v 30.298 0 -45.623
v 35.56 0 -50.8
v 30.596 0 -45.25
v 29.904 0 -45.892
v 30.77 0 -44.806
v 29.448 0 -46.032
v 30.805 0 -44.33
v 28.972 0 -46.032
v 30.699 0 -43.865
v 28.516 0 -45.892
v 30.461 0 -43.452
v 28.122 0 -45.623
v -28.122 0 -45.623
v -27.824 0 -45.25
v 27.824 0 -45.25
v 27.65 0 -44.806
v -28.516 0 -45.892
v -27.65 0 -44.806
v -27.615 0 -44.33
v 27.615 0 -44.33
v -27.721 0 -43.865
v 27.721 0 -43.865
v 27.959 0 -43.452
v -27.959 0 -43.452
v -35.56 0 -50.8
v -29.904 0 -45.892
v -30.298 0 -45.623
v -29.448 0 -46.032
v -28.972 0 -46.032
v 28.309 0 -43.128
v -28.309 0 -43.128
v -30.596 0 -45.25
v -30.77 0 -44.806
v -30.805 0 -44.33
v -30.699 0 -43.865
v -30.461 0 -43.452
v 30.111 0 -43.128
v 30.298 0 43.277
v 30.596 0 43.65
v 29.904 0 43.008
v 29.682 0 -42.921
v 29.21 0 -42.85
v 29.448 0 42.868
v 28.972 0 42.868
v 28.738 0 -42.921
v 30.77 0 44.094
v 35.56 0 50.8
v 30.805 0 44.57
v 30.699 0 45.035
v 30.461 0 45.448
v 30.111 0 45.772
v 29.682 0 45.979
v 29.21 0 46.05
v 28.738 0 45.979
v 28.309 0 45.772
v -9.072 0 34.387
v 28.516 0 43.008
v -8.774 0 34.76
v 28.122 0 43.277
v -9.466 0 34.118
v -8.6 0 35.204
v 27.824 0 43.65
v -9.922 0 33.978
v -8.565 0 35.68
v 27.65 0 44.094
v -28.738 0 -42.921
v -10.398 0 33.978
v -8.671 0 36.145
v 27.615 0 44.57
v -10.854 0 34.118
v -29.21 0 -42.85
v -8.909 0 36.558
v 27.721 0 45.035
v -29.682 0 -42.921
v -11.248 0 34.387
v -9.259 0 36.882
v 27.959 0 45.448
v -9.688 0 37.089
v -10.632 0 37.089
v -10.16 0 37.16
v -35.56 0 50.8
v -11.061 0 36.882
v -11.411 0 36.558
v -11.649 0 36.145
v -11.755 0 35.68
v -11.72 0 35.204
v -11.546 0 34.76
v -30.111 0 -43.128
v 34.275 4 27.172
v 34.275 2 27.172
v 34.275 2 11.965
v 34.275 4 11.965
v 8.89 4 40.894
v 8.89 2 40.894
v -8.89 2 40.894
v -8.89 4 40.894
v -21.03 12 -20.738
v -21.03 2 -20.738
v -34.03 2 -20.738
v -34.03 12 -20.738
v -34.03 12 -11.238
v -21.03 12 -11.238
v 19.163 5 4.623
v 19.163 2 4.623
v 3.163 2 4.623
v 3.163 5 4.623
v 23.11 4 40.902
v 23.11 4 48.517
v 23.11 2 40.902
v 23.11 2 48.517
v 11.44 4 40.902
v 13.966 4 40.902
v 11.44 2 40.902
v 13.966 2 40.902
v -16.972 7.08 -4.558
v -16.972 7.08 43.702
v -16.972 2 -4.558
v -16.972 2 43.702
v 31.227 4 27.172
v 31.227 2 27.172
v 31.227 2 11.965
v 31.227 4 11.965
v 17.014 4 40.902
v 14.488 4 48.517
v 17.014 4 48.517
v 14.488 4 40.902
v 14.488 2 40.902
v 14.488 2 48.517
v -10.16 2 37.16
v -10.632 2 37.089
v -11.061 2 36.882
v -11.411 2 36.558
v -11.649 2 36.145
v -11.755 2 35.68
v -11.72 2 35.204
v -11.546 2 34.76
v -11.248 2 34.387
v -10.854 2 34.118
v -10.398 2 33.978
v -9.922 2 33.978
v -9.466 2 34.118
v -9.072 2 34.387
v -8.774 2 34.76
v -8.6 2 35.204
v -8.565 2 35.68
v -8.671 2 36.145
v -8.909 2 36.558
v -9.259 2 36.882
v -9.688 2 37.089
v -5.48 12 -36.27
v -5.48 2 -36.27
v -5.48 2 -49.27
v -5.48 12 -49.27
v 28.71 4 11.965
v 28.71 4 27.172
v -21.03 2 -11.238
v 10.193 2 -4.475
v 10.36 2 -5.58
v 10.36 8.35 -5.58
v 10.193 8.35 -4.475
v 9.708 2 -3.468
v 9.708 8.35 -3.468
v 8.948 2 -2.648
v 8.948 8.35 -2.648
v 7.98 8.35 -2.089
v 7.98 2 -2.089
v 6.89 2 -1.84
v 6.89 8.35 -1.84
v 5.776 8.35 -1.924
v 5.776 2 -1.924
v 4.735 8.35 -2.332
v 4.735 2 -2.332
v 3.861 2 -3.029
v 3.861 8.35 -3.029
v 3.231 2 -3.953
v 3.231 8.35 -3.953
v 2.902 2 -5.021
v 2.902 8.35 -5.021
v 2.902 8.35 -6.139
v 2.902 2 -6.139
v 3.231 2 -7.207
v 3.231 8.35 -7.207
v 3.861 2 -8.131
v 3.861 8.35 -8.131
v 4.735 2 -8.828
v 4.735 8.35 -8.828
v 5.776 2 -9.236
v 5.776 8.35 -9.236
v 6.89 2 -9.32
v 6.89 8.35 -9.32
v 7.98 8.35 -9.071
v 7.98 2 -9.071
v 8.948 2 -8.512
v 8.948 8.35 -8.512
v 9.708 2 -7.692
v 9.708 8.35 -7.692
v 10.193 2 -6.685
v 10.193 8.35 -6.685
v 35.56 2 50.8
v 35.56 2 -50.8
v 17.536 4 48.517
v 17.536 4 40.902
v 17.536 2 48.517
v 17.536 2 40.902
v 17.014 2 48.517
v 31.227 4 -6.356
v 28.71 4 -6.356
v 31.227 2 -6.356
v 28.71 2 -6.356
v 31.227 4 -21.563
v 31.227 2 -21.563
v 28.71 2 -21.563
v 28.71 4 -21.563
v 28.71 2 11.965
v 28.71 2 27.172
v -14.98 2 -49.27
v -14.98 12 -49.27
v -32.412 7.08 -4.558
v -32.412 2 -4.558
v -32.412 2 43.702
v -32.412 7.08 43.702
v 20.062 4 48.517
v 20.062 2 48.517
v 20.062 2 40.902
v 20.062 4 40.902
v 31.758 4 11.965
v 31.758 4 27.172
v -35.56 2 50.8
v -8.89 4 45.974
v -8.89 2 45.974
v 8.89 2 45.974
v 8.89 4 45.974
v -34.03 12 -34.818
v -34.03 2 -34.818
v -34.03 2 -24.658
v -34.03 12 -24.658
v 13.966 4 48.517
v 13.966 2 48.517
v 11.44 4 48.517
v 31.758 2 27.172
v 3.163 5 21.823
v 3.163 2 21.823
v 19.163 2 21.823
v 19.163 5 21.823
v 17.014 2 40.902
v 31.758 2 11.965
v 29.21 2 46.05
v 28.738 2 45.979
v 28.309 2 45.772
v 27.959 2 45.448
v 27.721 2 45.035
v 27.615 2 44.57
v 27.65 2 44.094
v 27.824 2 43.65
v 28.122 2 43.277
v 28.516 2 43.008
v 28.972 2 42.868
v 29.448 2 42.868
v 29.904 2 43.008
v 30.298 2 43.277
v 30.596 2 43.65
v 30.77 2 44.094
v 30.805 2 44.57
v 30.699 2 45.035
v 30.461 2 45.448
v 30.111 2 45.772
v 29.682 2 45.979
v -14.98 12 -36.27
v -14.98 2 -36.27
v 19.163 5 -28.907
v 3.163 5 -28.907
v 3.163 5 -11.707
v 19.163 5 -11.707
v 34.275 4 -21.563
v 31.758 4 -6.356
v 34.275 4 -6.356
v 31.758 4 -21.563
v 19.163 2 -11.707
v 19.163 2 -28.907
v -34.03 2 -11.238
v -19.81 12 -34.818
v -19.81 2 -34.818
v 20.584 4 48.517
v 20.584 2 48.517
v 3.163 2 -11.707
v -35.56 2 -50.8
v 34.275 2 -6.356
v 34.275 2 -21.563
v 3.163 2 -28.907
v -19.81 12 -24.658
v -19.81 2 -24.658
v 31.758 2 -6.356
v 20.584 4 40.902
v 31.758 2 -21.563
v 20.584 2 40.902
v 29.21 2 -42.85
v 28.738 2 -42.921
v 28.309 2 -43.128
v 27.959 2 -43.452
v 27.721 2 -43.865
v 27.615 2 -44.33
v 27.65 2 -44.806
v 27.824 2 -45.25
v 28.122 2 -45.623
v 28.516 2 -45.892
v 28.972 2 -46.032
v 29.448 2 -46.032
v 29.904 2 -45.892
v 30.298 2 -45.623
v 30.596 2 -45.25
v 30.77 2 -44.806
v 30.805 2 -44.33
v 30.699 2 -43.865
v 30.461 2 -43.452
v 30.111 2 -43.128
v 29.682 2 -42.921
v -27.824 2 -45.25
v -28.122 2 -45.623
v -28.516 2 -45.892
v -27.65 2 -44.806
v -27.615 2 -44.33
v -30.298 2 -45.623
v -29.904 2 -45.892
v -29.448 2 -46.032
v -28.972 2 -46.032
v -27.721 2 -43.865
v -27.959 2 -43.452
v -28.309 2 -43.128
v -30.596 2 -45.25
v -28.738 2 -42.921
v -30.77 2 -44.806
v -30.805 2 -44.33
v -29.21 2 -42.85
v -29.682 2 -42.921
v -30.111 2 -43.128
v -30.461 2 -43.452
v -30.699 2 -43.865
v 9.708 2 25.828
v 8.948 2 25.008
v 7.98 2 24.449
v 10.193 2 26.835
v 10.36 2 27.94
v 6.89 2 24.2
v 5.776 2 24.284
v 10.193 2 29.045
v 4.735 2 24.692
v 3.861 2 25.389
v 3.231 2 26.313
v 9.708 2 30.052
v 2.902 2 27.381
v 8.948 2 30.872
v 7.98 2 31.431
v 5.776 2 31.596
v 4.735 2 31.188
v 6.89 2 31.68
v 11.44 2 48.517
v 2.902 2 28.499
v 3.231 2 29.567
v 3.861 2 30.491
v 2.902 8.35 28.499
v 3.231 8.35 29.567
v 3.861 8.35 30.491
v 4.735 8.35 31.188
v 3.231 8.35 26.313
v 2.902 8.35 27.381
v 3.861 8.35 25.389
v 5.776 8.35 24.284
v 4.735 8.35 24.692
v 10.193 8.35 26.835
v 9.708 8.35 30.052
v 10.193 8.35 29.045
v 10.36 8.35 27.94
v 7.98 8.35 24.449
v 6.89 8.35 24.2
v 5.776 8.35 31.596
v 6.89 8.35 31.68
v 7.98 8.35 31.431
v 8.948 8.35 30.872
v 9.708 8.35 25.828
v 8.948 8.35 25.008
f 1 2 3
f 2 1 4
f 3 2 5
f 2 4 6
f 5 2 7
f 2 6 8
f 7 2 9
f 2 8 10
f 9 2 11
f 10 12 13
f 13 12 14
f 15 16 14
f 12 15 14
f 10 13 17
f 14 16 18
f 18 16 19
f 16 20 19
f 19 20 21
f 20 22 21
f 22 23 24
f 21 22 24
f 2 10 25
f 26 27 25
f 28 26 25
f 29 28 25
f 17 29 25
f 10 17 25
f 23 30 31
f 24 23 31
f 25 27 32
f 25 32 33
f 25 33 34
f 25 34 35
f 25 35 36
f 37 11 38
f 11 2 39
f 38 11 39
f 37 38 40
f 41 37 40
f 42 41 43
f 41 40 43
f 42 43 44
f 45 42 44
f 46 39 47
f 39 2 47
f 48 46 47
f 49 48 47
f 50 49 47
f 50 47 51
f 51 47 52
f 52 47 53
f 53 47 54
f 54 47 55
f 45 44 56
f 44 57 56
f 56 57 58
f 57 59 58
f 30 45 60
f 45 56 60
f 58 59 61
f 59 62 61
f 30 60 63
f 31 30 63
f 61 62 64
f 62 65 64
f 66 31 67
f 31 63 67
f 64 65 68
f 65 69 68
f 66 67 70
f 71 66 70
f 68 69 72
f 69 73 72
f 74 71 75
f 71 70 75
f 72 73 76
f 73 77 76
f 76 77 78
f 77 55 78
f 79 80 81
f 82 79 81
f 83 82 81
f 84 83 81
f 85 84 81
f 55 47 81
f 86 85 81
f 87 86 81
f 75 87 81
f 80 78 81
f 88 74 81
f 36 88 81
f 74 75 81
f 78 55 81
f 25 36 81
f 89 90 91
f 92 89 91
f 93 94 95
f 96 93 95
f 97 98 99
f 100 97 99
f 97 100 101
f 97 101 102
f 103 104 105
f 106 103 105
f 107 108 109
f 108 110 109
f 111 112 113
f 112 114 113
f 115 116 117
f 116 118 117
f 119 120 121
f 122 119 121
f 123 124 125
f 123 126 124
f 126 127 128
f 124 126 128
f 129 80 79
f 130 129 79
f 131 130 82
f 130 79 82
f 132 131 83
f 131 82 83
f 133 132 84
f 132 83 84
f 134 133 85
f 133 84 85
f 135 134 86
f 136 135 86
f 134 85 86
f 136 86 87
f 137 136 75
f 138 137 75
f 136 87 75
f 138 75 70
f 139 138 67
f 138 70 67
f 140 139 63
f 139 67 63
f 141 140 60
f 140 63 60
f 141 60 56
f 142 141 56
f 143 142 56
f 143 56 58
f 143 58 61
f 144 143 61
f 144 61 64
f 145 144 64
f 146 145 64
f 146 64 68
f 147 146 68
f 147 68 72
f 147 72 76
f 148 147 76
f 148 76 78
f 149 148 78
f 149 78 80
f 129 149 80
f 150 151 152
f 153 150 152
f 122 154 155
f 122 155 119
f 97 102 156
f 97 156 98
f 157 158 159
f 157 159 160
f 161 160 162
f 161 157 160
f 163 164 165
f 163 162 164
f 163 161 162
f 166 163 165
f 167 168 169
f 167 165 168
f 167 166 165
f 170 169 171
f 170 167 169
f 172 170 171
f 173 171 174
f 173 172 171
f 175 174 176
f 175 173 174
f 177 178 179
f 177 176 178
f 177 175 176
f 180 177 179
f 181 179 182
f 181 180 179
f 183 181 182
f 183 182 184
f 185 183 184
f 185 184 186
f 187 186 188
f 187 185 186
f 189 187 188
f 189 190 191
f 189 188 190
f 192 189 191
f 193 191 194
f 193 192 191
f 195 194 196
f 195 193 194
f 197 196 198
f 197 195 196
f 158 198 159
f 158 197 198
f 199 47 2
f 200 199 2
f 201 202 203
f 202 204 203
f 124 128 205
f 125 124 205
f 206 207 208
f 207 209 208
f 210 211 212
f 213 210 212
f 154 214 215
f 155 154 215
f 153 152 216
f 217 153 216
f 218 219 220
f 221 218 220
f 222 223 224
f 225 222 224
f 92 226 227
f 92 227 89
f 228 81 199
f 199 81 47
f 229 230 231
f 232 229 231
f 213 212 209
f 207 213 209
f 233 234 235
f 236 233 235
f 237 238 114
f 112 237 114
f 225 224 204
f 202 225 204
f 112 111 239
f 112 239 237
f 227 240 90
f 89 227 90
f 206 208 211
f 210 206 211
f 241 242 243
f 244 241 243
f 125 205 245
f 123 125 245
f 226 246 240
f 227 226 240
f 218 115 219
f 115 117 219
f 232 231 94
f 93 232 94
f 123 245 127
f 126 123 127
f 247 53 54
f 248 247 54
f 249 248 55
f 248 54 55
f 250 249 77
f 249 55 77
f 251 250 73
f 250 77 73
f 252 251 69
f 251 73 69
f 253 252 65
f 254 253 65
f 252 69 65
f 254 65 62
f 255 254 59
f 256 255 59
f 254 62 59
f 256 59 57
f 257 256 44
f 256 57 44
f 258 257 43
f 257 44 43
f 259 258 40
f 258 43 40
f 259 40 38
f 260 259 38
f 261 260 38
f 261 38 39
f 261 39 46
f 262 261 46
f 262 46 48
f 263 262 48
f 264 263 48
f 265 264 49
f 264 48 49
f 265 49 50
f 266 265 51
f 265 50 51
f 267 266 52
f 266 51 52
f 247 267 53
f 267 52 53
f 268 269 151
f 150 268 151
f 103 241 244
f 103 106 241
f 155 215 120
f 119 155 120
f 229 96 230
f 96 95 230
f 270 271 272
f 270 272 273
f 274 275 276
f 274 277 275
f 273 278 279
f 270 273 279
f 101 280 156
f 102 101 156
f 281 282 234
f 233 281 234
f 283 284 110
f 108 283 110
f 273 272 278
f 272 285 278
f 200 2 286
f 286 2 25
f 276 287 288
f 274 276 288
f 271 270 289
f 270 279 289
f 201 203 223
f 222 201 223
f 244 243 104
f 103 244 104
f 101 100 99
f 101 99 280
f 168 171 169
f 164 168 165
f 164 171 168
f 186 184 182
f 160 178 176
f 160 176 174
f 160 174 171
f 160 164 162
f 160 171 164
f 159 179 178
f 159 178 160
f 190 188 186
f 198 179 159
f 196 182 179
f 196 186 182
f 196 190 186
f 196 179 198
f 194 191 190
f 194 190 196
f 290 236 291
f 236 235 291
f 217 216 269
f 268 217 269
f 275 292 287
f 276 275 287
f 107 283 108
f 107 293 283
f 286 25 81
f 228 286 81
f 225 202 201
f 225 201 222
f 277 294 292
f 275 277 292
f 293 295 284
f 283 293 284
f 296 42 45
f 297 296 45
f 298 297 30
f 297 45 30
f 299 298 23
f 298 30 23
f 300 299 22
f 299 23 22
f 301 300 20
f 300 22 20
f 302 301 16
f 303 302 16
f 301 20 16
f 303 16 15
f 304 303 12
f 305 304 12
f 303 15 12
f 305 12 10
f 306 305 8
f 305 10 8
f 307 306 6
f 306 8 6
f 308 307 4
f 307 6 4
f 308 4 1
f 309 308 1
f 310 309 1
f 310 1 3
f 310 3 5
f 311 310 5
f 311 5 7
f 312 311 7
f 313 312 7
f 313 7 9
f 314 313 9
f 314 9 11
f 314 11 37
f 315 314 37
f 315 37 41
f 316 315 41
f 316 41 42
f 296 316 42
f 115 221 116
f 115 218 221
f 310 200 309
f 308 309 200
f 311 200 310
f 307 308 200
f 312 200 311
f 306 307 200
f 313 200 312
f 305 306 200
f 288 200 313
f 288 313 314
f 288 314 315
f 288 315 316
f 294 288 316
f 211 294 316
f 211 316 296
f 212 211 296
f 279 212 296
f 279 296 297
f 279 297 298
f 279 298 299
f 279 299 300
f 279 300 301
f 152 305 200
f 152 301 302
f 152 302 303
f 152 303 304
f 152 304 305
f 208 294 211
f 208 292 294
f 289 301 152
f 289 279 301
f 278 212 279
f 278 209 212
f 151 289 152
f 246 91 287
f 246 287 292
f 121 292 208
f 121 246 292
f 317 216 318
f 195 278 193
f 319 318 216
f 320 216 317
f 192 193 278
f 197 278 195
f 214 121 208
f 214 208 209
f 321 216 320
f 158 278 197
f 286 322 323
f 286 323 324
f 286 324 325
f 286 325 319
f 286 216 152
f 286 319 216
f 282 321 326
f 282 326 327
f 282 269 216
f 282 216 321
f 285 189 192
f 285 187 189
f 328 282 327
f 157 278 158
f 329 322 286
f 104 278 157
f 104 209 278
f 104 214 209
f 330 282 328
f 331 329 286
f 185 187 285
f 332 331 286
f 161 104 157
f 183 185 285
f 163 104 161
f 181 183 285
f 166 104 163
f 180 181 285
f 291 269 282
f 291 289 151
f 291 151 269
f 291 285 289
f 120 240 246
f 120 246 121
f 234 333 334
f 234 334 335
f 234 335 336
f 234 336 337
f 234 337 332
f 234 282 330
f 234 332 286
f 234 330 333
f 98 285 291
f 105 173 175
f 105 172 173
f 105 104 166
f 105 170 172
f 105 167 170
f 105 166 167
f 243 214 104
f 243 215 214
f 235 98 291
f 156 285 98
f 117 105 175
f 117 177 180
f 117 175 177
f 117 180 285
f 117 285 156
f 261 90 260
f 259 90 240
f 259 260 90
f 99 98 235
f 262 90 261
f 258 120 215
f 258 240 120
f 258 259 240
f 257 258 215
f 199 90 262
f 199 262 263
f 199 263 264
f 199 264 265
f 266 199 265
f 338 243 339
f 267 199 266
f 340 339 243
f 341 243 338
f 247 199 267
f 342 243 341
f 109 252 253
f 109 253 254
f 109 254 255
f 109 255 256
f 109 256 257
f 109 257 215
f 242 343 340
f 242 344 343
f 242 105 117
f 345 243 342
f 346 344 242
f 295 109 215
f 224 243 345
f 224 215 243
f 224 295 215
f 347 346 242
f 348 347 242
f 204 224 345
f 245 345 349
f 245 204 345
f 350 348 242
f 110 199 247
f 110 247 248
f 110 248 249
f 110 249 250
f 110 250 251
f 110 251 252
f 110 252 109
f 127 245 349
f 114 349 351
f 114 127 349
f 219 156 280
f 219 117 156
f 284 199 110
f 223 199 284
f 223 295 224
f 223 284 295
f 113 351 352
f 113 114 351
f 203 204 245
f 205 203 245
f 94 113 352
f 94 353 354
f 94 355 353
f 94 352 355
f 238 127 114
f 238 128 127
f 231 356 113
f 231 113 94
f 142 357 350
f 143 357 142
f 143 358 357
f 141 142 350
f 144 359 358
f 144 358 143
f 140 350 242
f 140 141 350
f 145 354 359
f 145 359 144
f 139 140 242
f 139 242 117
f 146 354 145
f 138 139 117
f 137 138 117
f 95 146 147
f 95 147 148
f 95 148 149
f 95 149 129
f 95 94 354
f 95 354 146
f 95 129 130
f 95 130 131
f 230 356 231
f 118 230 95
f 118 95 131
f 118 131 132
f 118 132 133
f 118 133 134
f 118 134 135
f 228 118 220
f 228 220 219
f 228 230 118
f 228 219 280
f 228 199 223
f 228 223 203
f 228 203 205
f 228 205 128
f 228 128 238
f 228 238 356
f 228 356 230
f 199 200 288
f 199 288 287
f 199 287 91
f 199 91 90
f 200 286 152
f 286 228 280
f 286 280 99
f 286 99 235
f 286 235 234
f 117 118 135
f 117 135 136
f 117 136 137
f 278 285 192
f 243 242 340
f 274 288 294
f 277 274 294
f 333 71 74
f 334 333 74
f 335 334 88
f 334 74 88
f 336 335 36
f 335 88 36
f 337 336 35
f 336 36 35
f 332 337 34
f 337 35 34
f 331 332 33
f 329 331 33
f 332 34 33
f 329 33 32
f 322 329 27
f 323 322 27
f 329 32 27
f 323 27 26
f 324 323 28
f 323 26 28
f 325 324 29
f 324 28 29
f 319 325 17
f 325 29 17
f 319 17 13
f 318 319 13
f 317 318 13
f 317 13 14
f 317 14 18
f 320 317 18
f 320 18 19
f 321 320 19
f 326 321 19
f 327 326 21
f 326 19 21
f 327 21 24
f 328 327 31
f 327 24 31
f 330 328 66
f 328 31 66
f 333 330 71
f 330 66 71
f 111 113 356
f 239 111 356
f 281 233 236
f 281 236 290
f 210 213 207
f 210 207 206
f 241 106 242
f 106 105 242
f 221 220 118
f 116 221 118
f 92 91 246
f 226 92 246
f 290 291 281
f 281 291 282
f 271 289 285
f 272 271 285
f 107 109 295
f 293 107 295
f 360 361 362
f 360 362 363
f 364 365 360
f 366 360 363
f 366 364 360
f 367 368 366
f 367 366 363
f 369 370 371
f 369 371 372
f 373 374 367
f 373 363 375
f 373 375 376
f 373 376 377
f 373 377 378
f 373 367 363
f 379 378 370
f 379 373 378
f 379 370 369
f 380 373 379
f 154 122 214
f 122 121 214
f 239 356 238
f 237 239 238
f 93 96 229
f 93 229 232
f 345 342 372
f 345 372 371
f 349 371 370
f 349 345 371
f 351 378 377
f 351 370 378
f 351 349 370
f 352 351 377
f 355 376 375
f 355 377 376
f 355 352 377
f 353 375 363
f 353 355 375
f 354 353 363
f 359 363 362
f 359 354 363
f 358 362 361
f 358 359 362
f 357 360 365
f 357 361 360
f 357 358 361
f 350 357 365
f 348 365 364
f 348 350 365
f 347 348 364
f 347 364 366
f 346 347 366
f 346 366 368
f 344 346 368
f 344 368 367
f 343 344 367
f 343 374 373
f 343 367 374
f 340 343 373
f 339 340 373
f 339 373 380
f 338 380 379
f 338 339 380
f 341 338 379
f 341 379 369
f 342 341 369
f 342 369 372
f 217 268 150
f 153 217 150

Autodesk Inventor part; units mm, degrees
ref_plane "YZ Plane" through (0, 0, 0) normal (1, 0, 0) x (0, 1, 0)
ref_plane "XZ Plane" through (0, 0, 0) normal (0, 1, 0) x (-1, 0, 0)
ref_plane "XY Plane" through (0, 0, 0) normal (0, 0, 1) x (1, 0, 0)
sketch "Sketch1" plane through (0, 0, 0) normal (0, 1, 0) x (-1, 0, 0)
  line L0 (35.56, 50.8) -> (-35.56, 50.8)
  line L1 (-35.56, 50.8) -> (-35.56, -50.8)
  line L2 (-35.56, -50.8) -> (35.56, -50.8)
  line L3 (35.56, -50.8) -> (35.56, 50.8)
  point P0 (0, 0)
  point P1 (35.56, 0)
  point P2 (0, -50.8)
  dimension "d0" = 101.6
  dimension "d1" = 71.12
extrude "Extrusion1" add sketch "Sketch1" along normal blind 2
sketch "Sketch2" plane through (0, 2, 0) normal (0, 1, 0) x (1, 0, 0)
  line L0 (-35.56, 50.8) -> (-35.56, -50.8)
  line L1 (35.56, 50.8) -> (-35.56, 50.8)
  line L2 (35.56, -50.8) -> (35.56, 50.8)
  line L3 (-35.56, -50.8) -> (35.56, -50.8)
  point P0 (0, 0)
  point P1 (-10.16, -35.56)
  point P2 (-29.21, 44.45)
  point P3 (29.21, 44.45)
  point P4 (29.21, -44.45)
  dimension "d4" = 6.35
  dimension "d5" = 6.35
  dimension "d6" = 6.35
  dimension "d7" = 6.35
  dimension "d8" = 15.24
  dimension "d9" = 45.72
hole "Hole1" at (-10.16, 2, 35.56) at (-29.21, 2, -44.45) at (29.21, 2, -44.45) at (29.21, 2, 44.45) direction (0, -1, 0) diameter 3.1999 end through all
sketch "Sketch3" plane through (0, 2, 0) normal (0, 1, 0) x (1, 0, 0)
  line L0 (-32.412, -43.7017) -> (-16.972, -43.7017)
  line L1 (-16.972, -43.7017) -> (-16.972, 4.5583)
  line L2 (-16.972, 4.5583) -> (-32.412, 4.5583)
  line L3 (-32.412, 4.5583) -> (-32.412, -43.7017)
  line L4 (-35.56, -50.8) -> (35.56, -50.8)
  line L5 (-35.56, 50.8) -> (-35.56, -50.8)
  point P0 (0, 0)
  dimension "d17" = 15.44
  dimension "d18" = 48.26
  dimension "d19" = 7.0983
  dimension "d20" = 3.148
extrude "Extrusion2" add sketch "Sketch3" along normal blind 5.08
sketch "Sketch4" plane through (0, 2, 0) normal (0, 1, 0) x (1, 0, 0)
  line L0 (-34.03, 11.2383) -> (-21.03, 11.2383)
  line L1 (-21.03, 11.2383) -> (-21.03, 20.7383)
  line L2 (-21.03, 20.7383) -> (-34.03, 20.7383)
  line L3 (-34.03, 20.7383) -> (-34.03, 11.2383)
  line L4 (-34.03, 24.6583) -> (-19.81, 24.6583)
  line L5 (-19.81, 24.6583) -> (-19.81, 34.8183)
  line L6 (-19.81, 34.8183) -> (-34.03, 34.8183)
  line L7 (-34.03, 34.8183) -> (-34.03, 24.6583)
  line L8 (-14.98, 36.27) -> (-5.48, 36.27)
  line L9 (-5.48, 36.27) -> (-5.48, 49.27)
  line L10 (-5.48, 49.27) -> (-14.98, 49.27)
  line L11 (-14.98, 49.27) -> (-14.98, 36.27)
  line L12 (-16.972, 4.5583) -> (-32.412, 4.5583)
  line L13 (-35.56, 50.8) -> (-35.56, -50.8)
  line L14 (35.56, 50.8) -> (-35.56, 50.8)
  point P0 (0, 0)
  dimension "d23" = 13
  dimension "d24" = 9.5
  dimension "d25" = 3.92
  dimension "d26" = 6.68
  dimension "d27" = 1.53
  dimension "d28" = 1.53
  dimension "d29" = 20.58
  dimension "d66" = 14.22
  dimension "d67" = 13
  dimension "d68" = 10.16
extrude "Extrusion3" add sketch "Sketch4" along normal blind 10
sketch "Sketch5" plane through (0, 2, 0) normal (0, 1, 0) x (1, 0, 0)
  line L0 (3.1628, -21.8228) -> (19.1628, -21.8228)
  line L1 (19.1628, -21.8228) -> (19.1628, -4.6228)
  line L2 (19.1628, -4.6228) -> (3.1628, -4.6228)
  line L3 (3.1628, -4.6228) -> (3.1628, -21.8228)
  line L4 (3.1628, 11.7072) -> (19.1628, 11.7072)
  line L5 (19.1628, 11.7072) -> (19.1628, 28.9072)
  line L6 (19.1628, 28.9072) -> (3.1628, 28.9072)
  line L7 (3.1628, 28.9072) -> (3.1628, 11.7072)
  line L8 (35.56, -50.8) -> (35.56, 50.8)
  line L9 (35.56, 50.8) -> (-35.56, 50.8)
  point P0 (0, 0)
  dimension "d32" = 17.2
  dimension "d33" = 16
  dimension "d34" = 16.33
  dimension "d35" = 16.3972
  dimension "d36" = 21.8928
extrude "Extrusion4" add sketch "Sketch5" along normal blind 3
sketch "Sketch6" plane through (0, 2, 0) normal (0, 1, 0) x (1, 0, 0)
  circle A0 centre (6.61, -27.94) radius 3.75
  circle A1 centre (6.61, 5.58) radius 3.75
  line L0 (35.56, -50.8) -> (35.56, 50.8)
  line L1 (-35.56, -50.8) -> (35.56, -50.8)
  point P0 (0, 0)
  dimension "d39" = 7.5
  dimension "d40" = 26.02
  dimension "d41" = 25.2
  dimension "d42" = 19.11
extrude "Extrusion5" add sketch "Sketch6" along normal blind 6.35
sketch "Sketch7" plane through (0, 2, 0) normal (0, 1, 0) x (1, 0, 0)
  line L0 (11.4397, -48.5168) -> (13.9664, -48.5168)
  line L1 (13.9664, -48.5168) -> (13.9664, -40.9016)
  line L2 (13.9664, -40.9016) -> (11.4397, -40.9016)
  line L3 (11.4397, -40.9016) -> (11.4397, -48.5168)
  line L4 (14.4877, -48.5168) -> (17.0144, -48.5168)
  line L5 (17.0144, -48.5168) -> (17.0144, -40.9016)
  line L6 (17.0144, -40.9016) -> (14.4877, -40.9016)
  line L7 (14.4877, -40.9016) -> (14.4877, -48.5168)
  line L8 (17.5357, -48.5168) -> (20.0624, -48.5168)
  line L9 (20.0624, -48.5168) -> (20.0624, -40.9016)
  line L10 (20.0624, -40.9016) -> (17.5357, -40.9016)
  line L11 (17.5357, -40.9016) -> (17.5357, -48.5168)
  line L12 (20.5837, -48.5168) -> (23.1104, -48.5168)
  line L13 (23.1104, -48.5168) -> (23.1104, -40.9016)
  line L14 (23.1104, -40.9016) -> (20.5837, -40.9016)
  line L15 (20.5837, -40.9016) -> (20.5837, -48.5168)
  line L16 (28.7104, -27.1717) -> (31.2273, -27.1717)
  line L17 (31.2273, -27.1717) -> (31.2273, -11.9647)
  line L18 (31.2273, -11.9647) -> (28.7104, -11.9647)
  line L19 (28.7104, -11.9647) -> (28.7104, -27.1717)
  line L20 (31.7584, -27.1717) -> (34.2753, -27.1717)
  line L21 (34.2753, -27.1717) -> (34.2753, -11.9647)
  line L22 (34.2753, -11.9647) -> (31.7584, -11.9647)
  line L23 (31.7584, -11.9647) -> (31.7584, -27.1717)
  line L24 (28.7104, 6.3564) -> (31.2273, 6.3564)
  line L25 (31.2273, 6.3564) -> (31.2273, 21.5633)
  line L26 (31.2273, 21.5633) -> (28.7104, 21.5633)
  line L27 (28.7104, 21.5633) -> (28.7104, 6.3564)
  line L28 (-35.56, -50.8) -> (35.56, -50.8)
  line L29 (-8.89, -45.974) -> (8.89, -45.974)
  line L30 (8.89, -45.974) -> (8.89, -40.894)
  line L31 (8.89, -40.894) -> (-8.89, -40.894)
  line L32 (-8.89, -40.894) -> (-8.89, -45.974)
  line L33 (35.56, -50.8) -> (35.56, 50.8)
  line L34 (31.7584, 6.3564) -> (34.2753, 6.3564)
  line L35 (34.2753, 6.3564) -> (34.2753, 21.5633)
  line L36 (34.2753, 21.5633) -> (31.7584, 21.5633)
  line L37 (31.7584, 21.5633) -> (31.7584, 6.3564)
  line L38 (35.56, 50.8) -> (-35.56, 50.8)
  point P0 (0, 0)
  dimension "d47" = 7.6152
  dimension "d48" = 4.826
  dimension "d49" = 5.08
  dimension "d50" = 2.2832
  dimension "d51" = 2.5268
  dimension "d52" = 0.5212
  dimension "d53" = 0.5212
  dimension "d54" = 0.5212
  dimension "d55" = 12.4496
  dimension "d56" = 2.5497
  dimension "d57" = 17.78
  dimension "d58" = 15.207
  dimension "d59" = 2.5169
  dimension "d60" = 0.5311
  dimension "d61" = 18.321
  dimension "d62" = 1.2847
  dimension "d63" = 29.2367
extrude "Extrusion6" add sketch "Sketch7" along normal blind 2
equation "\"d67\" = d23"
equation "\"d53\" = d52"
equation "\"d54\" = d52"
properties part number "PCB"
